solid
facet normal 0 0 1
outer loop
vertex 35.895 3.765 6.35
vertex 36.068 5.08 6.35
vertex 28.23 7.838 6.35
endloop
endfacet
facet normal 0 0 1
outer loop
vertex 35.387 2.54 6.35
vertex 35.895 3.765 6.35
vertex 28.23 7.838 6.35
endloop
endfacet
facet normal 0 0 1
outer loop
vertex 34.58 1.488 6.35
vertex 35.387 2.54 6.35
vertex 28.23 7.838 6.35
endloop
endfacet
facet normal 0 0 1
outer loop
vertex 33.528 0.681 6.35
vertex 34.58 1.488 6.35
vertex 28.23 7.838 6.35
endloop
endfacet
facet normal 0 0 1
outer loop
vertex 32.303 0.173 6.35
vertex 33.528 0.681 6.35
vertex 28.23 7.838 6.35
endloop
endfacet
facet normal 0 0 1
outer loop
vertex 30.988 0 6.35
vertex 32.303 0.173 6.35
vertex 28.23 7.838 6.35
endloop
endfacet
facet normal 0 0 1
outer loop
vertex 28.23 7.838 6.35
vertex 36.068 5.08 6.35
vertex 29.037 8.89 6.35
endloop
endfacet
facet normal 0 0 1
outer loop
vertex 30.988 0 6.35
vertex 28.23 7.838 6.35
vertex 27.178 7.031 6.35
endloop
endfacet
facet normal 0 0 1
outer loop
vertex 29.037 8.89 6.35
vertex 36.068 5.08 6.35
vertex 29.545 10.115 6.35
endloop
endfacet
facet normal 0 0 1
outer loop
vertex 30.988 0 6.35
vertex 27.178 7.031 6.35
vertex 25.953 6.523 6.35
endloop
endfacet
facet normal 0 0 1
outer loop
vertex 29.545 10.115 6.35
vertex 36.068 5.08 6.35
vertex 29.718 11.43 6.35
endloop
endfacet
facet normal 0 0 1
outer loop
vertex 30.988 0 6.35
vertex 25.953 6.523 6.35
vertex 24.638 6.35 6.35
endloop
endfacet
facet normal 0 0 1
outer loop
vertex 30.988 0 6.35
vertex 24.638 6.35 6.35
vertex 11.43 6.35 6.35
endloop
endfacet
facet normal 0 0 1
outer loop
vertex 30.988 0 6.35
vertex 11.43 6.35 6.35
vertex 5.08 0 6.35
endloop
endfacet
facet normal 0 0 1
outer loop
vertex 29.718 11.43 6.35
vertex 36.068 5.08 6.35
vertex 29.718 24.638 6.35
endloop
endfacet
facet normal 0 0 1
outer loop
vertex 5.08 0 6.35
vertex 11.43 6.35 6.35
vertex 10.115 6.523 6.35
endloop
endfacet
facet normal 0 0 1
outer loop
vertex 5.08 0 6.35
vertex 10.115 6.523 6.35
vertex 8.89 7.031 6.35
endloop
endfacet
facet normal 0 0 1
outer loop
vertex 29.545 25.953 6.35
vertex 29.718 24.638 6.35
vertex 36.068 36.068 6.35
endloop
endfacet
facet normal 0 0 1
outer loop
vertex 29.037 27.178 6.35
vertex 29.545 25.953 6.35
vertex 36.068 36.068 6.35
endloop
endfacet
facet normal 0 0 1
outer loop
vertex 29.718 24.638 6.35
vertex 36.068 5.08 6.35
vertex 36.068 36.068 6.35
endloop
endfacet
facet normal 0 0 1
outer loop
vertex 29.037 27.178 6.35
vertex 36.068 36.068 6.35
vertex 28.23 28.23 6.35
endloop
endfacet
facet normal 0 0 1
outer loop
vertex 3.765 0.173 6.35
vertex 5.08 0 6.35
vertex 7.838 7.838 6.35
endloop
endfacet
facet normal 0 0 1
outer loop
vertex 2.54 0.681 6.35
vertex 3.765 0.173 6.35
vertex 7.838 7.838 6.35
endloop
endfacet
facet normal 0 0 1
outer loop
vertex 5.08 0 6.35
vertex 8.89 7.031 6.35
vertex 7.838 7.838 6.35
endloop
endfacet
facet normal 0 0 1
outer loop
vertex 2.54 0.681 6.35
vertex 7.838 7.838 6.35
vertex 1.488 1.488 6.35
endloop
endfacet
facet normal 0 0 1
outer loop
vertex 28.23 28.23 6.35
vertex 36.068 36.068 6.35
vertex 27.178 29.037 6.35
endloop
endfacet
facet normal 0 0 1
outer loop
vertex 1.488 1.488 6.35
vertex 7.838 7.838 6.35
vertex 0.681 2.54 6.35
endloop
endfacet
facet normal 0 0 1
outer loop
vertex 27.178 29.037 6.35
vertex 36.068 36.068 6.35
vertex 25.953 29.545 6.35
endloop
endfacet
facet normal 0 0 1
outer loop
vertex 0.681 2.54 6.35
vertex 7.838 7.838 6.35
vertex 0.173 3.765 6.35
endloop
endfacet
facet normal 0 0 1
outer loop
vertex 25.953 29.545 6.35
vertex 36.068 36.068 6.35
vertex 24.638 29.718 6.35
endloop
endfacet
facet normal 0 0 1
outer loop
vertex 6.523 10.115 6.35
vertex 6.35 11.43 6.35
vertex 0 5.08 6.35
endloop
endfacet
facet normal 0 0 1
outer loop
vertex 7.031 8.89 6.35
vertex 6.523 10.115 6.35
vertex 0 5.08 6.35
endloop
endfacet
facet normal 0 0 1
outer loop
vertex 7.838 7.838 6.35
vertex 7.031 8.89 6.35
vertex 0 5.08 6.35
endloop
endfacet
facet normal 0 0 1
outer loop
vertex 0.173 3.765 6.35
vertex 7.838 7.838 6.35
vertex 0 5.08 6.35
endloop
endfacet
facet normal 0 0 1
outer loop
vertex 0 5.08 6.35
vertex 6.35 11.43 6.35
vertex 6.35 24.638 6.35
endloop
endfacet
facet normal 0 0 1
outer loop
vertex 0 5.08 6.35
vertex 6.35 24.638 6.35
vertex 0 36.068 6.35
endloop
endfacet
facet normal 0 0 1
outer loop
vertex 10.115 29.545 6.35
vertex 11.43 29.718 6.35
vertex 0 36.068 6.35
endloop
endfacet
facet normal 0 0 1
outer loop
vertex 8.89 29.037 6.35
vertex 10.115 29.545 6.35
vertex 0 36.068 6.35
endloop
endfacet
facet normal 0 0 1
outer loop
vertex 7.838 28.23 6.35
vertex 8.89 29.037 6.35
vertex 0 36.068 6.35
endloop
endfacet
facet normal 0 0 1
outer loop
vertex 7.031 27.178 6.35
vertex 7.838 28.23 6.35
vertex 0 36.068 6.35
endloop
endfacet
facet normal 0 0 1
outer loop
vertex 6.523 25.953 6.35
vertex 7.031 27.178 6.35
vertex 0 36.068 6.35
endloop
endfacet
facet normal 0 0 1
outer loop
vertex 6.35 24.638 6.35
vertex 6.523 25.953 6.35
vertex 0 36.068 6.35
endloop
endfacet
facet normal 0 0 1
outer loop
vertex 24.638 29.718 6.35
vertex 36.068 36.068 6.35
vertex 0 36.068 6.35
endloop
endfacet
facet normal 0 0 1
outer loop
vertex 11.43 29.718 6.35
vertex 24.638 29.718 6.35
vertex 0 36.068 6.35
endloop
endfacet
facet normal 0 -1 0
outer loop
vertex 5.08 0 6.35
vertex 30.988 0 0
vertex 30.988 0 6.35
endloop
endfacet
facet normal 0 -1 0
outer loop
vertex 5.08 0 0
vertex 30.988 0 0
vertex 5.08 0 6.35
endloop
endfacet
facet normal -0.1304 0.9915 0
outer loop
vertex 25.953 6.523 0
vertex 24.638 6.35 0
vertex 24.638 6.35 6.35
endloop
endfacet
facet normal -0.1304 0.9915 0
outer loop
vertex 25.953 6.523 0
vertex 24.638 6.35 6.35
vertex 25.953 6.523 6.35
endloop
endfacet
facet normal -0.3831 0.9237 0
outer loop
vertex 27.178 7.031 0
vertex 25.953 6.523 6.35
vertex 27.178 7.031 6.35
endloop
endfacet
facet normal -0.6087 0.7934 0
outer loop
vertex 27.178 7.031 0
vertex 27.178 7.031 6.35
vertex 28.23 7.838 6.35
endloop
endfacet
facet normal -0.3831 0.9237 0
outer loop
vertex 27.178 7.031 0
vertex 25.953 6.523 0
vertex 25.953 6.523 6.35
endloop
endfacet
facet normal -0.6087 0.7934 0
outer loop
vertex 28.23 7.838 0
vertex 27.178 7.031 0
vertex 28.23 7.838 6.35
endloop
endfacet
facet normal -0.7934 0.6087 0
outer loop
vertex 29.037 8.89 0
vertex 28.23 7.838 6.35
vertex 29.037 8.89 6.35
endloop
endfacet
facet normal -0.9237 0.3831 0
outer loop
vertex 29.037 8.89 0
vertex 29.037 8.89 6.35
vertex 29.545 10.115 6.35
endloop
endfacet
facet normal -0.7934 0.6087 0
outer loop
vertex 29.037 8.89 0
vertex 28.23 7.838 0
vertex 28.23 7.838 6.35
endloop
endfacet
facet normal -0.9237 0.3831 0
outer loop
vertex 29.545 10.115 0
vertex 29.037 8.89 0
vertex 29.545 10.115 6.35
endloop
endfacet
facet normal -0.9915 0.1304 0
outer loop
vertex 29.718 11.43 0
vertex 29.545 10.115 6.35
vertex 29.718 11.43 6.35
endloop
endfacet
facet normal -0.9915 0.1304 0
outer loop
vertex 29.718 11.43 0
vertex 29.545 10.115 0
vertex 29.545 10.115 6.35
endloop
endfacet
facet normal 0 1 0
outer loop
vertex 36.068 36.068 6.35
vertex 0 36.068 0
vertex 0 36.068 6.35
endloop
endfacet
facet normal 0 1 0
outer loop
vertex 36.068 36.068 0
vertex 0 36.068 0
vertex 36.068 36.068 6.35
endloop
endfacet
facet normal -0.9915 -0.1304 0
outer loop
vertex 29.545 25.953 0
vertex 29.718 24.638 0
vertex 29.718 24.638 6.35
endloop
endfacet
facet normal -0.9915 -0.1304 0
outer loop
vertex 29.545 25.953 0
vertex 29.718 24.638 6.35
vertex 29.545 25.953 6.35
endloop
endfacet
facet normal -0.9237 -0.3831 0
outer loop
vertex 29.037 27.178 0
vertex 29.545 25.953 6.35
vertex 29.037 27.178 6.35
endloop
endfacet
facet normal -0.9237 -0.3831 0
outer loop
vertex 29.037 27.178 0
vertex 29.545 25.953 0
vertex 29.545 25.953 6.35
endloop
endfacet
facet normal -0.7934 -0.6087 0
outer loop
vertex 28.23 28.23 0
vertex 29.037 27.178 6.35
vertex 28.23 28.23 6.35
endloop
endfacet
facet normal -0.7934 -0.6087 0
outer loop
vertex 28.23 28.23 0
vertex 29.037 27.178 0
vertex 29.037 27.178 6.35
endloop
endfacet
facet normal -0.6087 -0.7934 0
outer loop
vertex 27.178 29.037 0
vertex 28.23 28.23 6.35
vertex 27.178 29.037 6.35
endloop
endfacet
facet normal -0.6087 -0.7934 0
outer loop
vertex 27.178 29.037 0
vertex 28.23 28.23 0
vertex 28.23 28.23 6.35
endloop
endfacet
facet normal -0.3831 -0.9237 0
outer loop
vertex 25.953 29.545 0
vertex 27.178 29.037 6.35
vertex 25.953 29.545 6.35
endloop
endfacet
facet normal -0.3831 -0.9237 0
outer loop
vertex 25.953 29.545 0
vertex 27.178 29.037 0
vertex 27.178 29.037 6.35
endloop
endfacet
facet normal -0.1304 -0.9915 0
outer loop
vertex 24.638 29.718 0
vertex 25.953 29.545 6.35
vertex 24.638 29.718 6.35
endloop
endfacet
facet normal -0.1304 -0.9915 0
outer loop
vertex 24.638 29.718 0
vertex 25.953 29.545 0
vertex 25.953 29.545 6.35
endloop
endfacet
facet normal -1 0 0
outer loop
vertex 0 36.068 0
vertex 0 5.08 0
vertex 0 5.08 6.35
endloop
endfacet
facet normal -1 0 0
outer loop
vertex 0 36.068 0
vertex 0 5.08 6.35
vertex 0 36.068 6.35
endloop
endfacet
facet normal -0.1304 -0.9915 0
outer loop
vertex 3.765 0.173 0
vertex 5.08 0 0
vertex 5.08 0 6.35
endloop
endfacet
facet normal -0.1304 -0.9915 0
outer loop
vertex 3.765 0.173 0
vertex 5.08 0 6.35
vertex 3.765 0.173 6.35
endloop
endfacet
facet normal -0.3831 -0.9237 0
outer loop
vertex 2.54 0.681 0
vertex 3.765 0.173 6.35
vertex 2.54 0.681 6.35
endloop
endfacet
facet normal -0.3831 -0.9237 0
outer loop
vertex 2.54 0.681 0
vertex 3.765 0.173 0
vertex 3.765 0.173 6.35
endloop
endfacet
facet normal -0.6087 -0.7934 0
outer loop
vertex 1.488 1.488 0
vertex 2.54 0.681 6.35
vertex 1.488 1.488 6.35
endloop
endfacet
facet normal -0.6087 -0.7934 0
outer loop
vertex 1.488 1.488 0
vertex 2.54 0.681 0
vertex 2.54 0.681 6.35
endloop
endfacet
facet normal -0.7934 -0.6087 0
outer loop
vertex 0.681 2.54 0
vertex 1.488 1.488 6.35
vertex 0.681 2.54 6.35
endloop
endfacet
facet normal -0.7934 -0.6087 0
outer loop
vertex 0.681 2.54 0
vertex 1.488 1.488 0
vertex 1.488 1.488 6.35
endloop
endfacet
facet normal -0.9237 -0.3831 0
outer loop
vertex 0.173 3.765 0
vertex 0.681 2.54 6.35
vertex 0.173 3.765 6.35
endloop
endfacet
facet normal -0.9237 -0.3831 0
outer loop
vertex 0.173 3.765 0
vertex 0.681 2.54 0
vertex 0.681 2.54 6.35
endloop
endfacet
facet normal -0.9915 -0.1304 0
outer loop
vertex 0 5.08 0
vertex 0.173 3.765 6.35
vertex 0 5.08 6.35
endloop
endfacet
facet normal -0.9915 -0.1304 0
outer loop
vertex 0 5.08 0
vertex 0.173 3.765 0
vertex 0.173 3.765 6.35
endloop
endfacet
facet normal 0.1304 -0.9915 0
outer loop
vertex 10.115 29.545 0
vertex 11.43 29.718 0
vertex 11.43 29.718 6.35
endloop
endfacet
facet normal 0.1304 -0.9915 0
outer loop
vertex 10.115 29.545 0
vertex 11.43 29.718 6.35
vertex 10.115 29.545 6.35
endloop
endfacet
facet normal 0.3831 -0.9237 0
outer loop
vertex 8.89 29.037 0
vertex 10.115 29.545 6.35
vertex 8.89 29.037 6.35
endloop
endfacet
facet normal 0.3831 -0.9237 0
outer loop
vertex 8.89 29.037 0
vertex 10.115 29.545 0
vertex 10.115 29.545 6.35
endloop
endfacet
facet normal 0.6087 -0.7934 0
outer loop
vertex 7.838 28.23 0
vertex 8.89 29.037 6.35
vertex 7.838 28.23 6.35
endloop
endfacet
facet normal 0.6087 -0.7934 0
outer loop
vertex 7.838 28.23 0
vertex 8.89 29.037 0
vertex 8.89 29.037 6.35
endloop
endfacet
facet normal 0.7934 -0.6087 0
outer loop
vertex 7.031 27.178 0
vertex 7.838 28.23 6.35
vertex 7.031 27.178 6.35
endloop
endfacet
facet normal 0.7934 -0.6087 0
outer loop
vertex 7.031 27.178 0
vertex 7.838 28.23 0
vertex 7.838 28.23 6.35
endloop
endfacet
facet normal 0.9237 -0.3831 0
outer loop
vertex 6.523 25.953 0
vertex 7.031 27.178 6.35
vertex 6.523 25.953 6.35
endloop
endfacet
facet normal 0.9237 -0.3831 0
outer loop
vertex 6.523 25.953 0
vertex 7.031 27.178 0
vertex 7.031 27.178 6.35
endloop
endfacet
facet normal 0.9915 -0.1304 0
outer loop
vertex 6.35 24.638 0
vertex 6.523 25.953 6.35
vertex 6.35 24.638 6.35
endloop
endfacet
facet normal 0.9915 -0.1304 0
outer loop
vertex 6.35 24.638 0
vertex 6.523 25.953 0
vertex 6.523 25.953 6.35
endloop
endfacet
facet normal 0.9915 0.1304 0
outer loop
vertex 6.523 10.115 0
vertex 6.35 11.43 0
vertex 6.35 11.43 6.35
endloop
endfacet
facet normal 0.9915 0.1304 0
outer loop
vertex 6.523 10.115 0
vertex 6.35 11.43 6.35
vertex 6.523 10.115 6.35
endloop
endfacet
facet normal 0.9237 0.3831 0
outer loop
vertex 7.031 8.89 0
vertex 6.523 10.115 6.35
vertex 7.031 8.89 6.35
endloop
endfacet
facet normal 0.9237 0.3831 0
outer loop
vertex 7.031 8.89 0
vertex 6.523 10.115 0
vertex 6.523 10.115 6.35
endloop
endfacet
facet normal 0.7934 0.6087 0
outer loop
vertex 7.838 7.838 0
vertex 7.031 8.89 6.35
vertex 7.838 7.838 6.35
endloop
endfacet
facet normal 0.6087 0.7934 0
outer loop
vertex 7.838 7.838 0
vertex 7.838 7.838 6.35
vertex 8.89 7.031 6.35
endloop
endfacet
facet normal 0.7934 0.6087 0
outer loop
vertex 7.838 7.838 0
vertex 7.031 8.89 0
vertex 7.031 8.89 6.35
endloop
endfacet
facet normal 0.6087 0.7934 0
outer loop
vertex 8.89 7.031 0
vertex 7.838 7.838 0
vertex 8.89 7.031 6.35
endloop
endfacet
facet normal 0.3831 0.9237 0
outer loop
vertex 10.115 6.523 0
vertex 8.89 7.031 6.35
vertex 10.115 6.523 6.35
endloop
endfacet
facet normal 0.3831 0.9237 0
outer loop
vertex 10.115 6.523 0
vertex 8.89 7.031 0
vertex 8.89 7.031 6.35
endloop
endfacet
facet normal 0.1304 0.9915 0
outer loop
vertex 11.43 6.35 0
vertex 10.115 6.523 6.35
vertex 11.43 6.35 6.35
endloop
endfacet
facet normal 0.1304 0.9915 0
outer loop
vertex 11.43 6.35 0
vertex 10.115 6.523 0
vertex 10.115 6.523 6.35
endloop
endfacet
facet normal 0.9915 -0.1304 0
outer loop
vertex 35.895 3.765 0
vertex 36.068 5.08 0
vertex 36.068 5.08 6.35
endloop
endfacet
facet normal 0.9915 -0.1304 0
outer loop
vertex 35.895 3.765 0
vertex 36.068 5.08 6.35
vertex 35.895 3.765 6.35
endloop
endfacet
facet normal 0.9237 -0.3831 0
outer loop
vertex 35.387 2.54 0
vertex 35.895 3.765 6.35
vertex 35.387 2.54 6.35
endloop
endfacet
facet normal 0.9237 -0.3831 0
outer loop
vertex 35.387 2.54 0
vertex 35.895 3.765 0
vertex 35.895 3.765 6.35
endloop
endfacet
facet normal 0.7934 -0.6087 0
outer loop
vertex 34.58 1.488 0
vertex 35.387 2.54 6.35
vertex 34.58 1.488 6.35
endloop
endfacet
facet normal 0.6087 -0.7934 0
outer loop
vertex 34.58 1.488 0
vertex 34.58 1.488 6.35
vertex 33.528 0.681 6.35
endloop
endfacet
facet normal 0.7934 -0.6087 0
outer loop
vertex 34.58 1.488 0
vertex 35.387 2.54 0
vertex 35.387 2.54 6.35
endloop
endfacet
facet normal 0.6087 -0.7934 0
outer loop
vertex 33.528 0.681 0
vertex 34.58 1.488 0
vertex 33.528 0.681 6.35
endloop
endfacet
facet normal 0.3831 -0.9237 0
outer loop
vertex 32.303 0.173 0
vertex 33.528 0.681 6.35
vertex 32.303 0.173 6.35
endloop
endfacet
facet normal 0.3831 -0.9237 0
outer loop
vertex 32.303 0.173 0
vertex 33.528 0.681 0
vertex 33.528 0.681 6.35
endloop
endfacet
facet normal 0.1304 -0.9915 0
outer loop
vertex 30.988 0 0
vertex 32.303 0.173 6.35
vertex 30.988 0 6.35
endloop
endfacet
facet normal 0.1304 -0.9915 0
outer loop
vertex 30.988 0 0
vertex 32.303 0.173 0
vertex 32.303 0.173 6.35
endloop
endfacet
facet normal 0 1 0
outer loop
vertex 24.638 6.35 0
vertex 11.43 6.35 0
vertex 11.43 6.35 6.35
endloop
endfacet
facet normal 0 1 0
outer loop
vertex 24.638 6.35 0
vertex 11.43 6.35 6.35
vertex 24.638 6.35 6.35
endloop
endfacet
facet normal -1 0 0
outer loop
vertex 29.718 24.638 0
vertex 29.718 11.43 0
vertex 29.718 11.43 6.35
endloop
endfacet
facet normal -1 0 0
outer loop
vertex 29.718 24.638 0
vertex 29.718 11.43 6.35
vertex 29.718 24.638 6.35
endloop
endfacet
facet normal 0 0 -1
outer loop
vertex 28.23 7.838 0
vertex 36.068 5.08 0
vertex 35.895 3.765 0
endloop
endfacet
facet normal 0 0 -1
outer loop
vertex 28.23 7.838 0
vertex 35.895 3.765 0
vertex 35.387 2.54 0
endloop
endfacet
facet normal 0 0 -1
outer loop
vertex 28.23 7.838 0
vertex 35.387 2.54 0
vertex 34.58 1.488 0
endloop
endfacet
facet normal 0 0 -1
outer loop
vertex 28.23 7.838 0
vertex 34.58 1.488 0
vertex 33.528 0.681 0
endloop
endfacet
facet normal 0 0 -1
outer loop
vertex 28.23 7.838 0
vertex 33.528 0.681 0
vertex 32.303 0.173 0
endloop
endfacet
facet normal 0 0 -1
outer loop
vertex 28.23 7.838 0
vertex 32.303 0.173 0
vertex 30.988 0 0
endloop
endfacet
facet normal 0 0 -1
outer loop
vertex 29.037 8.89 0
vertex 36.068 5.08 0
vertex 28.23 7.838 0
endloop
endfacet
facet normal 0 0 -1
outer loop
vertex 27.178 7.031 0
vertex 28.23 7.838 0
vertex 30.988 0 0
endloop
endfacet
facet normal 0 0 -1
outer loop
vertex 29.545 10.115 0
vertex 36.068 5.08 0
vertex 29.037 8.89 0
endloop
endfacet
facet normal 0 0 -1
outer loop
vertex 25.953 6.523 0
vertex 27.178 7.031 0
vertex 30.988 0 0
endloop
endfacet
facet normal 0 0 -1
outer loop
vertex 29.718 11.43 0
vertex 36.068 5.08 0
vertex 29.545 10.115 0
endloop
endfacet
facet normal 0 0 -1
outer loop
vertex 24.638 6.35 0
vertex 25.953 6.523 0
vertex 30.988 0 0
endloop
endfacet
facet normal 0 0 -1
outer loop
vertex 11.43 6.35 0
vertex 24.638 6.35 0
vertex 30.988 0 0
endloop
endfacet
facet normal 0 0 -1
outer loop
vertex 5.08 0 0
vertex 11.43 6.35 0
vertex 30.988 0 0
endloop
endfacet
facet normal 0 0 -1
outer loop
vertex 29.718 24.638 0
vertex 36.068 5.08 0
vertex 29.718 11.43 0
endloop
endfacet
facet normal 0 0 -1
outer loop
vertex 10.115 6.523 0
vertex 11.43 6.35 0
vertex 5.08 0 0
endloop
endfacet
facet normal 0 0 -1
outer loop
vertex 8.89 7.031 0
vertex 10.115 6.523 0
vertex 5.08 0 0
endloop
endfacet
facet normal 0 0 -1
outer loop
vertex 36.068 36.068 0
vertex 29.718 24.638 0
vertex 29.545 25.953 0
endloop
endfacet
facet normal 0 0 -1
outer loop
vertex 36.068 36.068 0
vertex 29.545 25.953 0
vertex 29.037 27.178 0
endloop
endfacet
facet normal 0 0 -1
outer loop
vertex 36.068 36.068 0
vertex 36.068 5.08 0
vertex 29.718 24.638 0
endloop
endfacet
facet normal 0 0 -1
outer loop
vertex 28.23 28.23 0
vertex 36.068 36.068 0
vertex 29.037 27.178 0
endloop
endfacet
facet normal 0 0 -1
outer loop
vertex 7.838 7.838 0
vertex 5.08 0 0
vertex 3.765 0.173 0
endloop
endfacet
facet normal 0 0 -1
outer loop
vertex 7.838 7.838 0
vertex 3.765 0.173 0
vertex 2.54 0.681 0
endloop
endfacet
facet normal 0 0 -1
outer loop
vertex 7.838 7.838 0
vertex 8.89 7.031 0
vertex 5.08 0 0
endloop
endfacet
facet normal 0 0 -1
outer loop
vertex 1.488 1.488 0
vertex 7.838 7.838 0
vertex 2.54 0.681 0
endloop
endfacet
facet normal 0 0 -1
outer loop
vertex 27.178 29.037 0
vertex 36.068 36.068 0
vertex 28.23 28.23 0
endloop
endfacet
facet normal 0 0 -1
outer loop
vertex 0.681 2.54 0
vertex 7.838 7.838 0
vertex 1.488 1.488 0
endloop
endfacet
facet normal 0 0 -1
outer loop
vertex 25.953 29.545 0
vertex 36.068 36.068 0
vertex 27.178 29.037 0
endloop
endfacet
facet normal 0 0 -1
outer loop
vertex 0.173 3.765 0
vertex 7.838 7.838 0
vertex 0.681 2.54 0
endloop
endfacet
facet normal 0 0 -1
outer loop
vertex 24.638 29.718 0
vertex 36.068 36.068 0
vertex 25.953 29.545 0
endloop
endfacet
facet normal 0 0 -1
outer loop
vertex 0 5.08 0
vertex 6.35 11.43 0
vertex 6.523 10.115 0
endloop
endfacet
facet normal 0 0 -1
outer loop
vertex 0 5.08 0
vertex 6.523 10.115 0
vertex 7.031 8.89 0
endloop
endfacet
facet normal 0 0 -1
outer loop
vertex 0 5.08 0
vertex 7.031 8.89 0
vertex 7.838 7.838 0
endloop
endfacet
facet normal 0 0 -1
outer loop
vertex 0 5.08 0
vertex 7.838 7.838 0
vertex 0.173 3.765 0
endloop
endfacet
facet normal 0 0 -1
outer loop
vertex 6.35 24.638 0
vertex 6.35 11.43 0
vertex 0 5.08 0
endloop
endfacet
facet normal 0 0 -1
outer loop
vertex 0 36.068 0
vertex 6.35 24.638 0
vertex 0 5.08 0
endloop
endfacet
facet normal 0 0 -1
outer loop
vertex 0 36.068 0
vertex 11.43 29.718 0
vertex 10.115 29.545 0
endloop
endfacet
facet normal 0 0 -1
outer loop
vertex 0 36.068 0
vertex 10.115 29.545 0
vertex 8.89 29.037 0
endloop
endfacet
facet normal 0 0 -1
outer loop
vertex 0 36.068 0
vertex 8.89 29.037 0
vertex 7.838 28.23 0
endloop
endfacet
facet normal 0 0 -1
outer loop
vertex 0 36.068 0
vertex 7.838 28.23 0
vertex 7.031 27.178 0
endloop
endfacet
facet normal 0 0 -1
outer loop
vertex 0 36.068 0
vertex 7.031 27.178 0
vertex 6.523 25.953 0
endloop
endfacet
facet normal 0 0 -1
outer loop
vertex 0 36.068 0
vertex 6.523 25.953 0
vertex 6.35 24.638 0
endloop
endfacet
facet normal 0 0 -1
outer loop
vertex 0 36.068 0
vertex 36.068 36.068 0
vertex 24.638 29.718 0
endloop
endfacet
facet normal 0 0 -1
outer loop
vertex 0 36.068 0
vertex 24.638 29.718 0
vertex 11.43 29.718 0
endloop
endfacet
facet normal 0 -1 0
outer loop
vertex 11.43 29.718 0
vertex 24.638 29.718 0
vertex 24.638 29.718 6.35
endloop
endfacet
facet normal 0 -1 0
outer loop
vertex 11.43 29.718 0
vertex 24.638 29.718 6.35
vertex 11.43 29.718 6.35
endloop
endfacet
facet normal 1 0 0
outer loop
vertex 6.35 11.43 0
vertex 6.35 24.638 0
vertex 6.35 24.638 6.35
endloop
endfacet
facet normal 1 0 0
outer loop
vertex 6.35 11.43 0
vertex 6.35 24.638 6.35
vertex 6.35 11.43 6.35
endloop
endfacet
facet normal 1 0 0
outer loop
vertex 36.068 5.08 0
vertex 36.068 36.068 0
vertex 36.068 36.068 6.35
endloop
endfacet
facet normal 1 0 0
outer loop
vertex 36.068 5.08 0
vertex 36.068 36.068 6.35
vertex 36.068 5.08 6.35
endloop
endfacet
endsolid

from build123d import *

# Parameters (mm, degrees)
BOSS_EXTRUDE1_DEPTH = 6.35


with BuildPart() as part:
    # Sketch1 → Boss-Extrude1 (new body)
    with BuildSketch(Plane.XY):
        with BuildLine():
            Line((0, 5.08), (0, 36.068))
            Line((0, 36.068), (36.068, 36.068))
            Line((36.068, 36.068), (36.068, 5.08))
            ThreePointArc((36.068, 5.08), (34.580102448, 1.487897552), (30.988, 0))
            Line((30.988, 0), (5.08, 0))
            ThreePointArc((5.08, 0), (1.487897552, 1.487897552), (0, 5.08))
        make_face()
        with BuildLine():
            Line((11.43, 6.35), (24.638, 6.35))
            ThreePointArc((24.638, 6.35), (28.230102448, 7.837897552), (29.718, 11.43))
            Line((29.718, 11.43), (29.718, 24.638))
            ThreePointArc((29.718, 24.638), (28.230102448, 28.230102448), (24.638, 29.718))
            Line((24.638, 29.718), (11.43, 29.718))
            ThreePointArc((11.43, 29.718), (7.837897552, 28.230102448), (6.35, 24.638))
            Line((6.35, 24.638), (6.35, 11.43))
            ThreePointArc((6.35, 11.43), (7.837897552, 7.837897552), (11.43, 6.35))
        make_face(mode=Mode.SUBTRACT)
    extrude(amount=BOSS_EXTRUDE1_DEPTH)


solid = part.part
